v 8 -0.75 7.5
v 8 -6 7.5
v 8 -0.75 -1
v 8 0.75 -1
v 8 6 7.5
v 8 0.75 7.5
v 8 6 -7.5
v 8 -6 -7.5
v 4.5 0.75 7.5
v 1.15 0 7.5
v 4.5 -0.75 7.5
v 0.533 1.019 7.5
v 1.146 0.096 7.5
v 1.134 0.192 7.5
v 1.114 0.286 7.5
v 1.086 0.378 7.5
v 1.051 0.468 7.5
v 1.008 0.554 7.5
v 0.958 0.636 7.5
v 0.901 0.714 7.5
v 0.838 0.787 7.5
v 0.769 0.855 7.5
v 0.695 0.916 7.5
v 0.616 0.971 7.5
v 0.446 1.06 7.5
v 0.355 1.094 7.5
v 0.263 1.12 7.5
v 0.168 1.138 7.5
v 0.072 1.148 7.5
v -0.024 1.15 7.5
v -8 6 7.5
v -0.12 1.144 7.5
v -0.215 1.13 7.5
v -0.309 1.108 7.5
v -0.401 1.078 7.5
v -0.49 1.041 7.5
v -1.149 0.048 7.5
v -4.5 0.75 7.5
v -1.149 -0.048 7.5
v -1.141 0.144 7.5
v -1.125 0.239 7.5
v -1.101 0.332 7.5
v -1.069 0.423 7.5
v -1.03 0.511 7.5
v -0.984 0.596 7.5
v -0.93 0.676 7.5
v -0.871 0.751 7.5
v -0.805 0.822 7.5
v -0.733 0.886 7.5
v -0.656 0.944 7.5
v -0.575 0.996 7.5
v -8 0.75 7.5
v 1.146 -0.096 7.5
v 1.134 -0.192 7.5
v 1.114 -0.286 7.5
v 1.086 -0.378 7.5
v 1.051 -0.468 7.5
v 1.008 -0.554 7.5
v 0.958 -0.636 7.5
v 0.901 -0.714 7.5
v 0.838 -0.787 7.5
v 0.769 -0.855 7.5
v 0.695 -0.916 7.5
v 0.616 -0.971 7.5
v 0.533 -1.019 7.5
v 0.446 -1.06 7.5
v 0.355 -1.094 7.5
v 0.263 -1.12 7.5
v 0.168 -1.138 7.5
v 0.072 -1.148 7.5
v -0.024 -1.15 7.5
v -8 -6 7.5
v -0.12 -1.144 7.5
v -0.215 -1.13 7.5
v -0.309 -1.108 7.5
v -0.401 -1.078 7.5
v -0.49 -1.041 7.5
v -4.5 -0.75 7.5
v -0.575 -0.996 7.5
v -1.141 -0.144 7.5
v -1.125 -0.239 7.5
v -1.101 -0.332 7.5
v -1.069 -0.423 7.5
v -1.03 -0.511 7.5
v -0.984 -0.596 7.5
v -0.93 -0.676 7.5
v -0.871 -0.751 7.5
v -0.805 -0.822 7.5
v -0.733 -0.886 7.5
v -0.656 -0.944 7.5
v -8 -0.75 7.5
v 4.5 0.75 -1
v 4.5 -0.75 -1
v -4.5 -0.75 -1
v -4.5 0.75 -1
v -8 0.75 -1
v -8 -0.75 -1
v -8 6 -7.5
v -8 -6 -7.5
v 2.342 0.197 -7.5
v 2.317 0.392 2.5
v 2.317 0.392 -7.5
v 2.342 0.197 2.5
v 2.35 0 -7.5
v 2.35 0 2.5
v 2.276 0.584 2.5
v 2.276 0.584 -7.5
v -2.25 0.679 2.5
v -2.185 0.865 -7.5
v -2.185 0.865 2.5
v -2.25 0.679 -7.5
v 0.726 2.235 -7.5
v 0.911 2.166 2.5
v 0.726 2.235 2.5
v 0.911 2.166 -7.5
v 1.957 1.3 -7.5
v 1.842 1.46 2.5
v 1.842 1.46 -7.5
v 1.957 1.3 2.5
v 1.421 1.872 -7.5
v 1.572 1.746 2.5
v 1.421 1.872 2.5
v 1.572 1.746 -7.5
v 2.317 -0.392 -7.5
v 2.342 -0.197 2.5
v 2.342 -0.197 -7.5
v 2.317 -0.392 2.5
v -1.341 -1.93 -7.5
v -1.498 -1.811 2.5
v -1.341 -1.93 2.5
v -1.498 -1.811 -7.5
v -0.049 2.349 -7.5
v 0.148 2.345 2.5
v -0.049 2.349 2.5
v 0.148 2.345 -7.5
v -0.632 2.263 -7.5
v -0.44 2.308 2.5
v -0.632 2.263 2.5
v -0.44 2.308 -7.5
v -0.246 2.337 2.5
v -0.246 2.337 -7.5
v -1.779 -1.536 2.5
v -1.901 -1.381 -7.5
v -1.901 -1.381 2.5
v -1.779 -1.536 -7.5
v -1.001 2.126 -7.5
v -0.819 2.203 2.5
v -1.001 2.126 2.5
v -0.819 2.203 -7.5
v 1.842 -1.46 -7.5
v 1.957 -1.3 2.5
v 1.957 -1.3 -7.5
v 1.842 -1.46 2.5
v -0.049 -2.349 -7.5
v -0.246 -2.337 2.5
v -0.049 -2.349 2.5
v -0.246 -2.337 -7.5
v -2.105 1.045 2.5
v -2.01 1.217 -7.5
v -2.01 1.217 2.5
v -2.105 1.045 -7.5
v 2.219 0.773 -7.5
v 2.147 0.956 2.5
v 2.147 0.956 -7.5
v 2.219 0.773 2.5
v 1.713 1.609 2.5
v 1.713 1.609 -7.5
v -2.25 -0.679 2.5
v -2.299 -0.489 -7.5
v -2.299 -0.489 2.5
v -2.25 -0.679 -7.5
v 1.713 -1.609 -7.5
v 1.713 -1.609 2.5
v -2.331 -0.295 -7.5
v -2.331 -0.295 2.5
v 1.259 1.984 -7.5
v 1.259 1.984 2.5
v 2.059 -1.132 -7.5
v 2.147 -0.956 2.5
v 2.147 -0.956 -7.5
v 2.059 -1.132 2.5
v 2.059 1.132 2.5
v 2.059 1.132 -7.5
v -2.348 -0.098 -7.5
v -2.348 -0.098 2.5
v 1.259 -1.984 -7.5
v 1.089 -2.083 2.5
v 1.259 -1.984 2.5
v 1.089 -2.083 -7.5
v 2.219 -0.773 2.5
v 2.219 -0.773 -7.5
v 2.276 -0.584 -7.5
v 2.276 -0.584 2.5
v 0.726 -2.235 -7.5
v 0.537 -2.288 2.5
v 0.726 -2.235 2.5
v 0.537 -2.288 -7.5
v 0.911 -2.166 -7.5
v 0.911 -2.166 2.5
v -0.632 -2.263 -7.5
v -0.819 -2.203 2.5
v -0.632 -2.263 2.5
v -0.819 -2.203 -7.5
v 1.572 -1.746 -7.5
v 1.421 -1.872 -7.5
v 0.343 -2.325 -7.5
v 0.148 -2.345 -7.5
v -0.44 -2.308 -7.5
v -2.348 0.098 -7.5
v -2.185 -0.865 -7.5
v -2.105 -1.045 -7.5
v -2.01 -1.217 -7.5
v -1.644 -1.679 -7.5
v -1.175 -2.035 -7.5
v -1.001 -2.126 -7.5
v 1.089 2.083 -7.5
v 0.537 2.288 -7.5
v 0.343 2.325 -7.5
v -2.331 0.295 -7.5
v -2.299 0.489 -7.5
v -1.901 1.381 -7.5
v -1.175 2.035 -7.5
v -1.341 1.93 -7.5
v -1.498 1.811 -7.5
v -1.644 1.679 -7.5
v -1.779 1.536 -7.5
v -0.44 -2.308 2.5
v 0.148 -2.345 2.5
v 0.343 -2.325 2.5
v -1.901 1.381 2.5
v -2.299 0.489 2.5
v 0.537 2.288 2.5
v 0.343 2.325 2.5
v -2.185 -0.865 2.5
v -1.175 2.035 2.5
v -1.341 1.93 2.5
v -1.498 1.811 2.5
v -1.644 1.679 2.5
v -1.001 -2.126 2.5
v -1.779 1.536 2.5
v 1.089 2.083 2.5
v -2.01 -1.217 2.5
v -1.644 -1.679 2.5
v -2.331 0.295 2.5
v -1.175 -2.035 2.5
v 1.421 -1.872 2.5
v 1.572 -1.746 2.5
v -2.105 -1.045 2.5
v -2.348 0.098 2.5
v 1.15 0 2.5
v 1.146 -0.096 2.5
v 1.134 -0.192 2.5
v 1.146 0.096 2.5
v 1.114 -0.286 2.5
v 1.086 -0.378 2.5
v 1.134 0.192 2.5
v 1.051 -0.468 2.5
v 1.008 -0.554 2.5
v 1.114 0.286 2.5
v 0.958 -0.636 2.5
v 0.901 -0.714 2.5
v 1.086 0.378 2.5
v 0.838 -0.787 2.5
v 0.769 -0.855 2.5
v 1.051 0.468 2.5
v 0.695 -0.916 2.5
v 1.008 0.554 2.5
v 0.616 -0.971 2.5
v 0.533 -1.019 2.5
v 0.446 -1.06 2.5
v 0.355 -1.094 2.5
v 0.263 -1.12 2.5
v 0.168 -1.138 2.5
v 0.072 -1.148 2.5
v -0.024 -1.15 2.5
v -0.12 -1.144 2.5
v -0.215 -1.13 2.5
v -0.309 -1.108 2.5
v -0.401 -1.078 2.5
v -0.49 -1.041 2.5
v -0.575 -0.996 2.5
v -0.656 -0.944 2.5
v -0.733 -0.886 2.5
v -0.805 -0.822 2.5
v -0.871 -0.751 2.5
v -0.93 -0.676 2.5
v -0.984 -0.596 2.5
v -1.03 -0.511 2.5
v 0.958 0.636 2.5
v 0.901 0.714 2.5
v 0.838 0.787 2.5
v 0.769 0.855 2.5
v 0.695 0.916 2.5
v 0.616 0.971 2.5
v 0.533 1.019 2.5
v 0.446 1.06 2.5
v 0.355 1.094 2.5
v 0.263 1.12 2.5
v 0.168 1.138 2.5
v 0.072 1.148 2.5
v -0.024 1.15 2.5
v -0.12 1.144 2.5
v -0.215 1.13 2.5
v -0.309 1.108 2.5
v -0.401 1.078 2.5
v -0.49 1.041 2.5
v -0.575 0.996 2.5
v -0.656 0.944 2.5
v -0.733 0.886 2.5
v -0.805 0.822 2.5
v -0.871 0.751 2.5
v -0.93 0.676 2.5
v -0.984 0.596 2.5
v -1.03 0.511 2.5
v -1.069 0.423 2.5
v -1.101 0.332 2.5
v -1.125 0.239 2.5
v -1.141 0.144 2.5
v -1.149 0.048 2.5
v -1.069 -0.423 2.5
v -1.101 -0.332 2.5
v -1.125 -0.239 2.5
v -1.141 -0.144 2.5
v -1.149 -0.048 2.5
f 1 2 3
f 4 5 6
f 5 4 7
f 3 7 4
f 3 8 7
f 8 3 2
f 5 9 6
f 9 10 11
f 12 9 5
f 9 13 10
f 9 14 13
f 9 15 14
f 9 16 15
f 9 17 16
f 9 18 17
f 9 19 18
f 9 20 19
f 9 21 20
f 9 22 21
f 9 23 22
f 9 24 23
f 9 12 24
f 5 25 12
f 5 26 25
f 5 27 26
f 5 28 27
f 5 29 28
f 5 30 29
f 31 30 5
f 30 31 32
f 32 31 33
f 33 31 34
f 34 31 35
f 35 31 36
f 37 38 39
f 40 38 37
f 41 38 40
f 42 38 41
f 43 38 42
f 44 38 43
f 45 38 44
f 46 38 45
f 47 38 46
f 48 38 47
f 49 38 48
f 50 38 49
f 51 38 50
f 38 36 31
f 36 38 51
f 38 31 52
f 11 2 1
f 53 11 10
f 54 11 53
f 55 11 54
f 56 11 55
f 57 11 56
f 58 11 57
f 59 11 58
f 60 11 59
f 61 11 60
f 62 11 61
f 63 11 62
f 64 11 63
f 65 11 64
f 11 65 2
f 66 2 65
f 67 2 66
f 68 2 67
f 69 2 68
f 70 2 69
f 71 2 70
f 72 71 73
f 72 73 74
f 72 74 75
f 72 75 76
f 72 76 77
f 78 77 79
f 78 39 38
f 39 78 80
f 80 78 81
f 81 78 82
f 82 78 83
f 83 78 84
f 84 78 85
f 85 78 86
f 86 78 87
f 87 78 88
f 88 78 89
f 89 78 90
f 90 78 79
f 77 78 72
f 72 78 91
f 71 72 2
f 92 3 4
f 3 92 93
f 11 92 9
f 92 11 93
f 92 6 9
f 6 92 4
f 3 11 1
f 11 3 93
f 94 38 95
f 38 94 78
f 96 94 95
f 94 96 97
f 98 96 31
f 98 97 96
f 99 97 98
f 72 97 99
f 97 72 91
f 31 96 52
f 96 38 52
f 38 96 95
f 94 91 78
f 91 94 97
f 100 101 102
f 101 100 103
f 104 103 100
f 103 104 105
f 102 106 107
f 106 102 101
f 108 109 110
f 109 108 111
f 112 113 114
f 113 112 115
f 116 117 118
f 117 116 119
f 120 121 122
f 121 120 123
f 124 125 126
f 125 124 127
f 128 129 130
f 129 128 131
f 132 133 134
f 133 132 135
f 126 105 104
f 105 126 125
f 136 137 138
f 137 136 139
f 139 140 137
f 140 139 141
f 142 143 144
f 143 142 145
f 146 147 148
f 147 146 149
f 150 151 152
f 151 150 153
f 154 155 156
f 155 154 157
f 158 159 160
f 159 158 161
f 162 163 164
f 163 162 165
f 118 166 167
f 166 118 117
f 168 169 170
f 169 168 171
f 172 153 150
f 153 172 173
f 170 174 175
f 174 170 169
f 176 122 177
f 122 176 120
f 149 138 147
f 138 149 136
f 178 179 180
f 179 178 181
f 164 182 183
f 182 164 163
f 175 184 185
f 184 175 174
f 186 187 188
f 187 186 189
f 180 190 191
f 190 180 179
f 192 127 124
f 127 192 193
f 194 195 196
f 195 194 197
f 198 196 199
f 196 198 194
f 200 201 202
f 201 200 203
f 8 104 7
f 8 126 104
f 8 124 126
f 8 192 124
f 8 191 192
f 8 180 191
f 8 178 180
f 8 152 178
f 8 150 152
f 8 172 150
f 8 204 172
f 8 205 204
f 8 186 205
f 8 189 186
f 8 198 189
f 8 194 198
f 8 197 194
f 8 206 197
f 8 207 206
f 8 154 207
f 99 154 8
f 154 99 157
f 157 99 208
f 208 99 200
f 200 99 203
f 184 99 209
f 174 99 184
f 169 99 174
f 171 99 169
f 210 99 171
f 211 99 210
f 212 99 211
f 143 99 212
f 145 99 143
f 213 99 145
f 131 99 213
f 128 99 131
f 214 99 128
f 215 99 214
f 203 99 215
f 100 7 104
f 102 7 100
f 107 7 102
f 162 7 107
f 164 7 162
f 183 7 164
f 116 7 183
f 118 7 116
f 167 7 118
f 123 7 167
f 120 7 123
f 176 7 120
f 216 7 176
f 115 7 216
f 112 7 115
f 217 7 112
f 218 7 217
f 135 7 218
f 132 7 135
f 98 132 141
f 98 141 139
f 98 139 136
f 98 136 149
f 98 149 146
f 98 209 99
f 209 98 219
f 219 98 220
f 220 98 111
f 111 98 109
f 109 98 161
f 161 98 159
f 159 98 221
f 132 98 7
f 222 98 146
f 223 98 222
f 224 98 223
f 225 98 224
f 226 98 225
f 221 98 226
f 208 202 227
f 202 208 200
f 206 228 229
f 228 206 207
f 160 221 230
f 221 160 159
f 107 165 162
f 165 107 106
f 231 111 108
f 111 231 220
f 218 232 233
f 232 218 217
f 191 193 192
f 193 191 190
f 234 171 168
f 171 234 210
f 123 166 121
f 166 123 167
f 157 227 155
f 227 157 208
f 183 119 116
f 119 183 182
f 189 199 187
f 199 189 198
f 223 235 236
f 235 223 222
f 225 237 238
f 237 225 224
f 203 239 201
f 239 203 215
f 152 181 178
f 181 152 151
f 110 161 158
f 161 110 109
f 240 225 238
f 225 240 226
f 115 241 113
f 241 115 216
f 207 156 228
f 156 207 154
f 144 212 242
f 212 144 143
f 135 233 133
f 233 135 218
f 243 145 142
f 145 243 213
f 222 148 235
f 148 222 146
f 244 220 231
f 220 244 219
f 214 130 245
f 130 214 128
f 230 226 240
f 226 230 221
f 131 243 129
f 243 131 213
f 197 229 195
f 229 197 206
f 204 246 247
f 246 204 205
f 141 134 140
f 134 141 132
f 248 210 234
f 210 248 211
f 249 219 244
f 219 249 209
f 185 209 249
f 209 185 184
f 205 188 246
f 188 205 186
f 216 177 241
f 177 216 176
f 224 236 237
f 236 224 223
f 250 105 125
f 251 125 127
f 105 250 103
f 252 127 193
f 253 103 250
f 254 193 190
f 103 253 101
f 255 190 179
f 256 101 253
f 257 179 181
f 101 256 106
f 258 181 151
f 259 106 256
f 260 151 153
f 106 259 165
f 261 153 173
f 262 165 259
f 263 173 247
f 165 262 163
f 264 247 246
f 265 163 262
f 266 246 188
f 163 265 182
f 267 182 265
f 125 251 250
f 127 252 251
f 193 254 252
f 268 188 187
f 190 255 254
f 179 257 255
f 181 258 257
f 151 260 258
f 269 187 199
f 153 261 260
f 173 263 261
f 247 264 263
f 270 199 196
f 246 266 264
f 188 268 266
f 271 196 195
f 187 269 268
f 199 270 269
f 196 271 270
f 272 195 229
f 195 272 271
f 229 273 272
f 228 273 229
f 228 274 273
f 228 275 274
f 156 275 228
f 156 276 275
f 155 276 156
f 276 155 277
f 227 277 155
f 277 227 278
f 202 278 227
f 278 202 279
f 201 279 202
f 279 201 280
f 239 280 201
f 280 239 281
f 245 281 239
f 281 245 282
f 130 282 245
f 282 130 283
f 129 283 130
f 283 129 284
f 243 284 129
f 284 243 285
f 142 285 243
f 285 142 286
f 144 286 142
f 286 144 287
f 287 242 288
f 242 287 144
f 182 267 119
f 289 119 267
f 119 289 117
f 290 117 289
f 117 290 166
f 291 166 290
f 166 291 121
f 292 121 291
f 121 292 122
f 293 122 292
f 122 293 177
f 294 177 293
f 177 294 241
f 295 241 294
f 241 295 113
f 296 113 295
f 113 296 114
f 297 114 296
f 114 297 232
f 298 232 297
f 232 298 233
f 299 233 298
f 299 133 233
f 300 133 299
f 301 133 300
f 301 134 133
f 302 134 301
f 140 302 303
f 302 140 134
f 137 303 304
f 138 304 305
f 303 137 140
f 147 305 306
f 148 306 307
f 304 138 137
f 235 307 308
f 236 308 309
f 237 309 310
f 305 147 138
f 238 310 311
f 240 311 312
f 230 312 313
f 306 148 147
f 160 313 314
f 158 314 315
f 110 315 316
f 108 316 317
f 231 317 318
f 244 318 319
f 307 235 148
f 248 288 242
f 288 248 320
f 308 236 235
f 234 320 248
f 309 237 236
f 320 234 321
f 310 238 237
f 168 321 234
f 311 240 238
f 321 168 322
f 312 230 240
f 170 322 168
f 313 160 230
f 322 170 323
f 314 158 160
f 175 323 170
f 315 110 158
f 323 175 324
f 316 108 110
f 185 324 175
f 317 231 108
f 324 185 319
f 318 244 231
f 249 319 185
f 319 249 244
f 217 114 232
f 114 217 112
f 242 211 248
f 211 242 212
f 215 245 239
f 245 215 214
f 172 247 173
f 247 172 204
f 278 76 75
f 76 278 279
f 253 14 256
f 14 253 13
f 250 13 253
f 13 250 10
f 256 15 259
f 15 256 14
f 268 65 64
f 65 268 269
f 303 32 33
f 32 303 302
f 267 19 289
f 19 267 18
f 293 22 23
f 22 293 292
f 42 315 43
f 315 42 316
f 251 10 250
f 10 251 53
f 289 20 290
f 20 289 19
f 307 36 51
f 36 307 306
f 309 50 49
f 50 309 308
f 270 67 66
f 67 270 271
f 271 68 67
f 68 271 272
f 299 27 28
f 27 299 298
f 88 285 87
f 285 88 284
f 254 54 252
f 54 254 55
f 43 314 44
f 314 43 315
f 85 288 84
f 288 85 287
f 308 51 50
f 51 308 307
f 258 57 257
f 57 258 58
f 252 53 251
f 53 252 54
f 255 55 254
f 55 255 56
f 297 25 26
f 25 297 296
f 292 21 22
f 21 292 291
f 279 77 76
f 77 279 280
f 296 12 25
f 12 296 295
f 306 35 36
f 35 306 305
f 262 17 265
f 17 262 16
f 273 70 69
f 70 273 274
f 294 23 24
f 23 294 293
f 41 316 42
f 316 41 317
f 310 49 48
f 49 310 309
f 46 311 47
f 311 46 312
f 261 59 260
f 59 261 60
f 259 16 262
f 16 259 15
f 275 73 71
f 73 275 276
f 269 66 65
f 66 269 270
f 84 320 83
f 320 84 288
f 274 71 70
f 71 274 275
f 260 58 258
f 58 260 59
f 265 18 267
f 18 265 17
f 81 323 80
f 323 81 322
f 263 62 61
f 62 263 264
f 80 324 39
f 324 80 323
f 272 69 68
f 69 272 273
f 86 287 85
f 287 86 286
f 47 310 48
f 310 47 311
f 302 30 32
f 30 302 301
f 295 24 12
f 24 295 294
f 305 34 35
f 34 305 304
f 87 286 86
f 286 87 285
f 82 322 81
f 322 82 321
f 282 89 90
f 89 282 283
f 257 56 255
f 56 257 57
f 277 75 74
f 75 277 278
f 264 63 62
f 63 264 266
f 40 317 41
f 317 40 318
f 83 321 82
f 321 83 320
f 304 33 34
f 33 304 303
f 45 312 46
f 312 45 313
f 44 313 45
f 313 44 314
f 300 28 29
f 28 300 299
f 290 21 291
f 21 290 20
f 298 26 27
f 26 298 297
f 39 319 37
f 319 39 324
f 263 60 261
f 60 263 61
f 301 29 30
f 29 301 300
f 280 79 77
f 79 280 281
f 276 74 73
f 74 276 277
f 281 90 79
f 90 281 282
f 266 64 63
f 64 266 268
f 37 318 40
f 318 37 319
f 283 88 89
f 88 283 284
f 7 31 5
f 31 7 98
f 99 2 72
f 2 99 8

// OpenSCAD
$fn = 75;

blocker_height = 15;
blocker_width = 16;
blocker_depth = 12;

cut_height = 8.5;
cut_depth = 1.5;
cut_width = 3.5;

line_hole_d = 4.7;
line_hole_height = 10;
small_line_hole_d = 2.3;

difference() {
    blocker_base();
    union() {
        translate([
            (blocker_width-cut_width)/2,
            0,
            (blocker_height-cut_height)/2
        ])
        cut();
        translate([
            -(blocker_width-cut_width)/2,
            0,
            (blocker_height-cut_height)/2
        ])
        cut();
        translate([
            0,
            0,
            -(blocker_height-line_hole_height)/2
        ])
        line_hole();
        small_line_hole();
    };
};

module blocker_base() {
    cube([blocker_width, blocker_depth, blocker_height], center=true);
};

module cut() {
    cube([cut_width, cut_depth, cut_height], center=true);
};

module line_hole() {
    cylinder(r1=line_hole_d/2, r2=line_hole_d/2, h=line_hole_height, center=true);
};

module small_line_hole() {
    cylinder(r1=small_line_hole_d/2, r2=small_line_hole_d/2, h=blocker_height, center=true);
};
